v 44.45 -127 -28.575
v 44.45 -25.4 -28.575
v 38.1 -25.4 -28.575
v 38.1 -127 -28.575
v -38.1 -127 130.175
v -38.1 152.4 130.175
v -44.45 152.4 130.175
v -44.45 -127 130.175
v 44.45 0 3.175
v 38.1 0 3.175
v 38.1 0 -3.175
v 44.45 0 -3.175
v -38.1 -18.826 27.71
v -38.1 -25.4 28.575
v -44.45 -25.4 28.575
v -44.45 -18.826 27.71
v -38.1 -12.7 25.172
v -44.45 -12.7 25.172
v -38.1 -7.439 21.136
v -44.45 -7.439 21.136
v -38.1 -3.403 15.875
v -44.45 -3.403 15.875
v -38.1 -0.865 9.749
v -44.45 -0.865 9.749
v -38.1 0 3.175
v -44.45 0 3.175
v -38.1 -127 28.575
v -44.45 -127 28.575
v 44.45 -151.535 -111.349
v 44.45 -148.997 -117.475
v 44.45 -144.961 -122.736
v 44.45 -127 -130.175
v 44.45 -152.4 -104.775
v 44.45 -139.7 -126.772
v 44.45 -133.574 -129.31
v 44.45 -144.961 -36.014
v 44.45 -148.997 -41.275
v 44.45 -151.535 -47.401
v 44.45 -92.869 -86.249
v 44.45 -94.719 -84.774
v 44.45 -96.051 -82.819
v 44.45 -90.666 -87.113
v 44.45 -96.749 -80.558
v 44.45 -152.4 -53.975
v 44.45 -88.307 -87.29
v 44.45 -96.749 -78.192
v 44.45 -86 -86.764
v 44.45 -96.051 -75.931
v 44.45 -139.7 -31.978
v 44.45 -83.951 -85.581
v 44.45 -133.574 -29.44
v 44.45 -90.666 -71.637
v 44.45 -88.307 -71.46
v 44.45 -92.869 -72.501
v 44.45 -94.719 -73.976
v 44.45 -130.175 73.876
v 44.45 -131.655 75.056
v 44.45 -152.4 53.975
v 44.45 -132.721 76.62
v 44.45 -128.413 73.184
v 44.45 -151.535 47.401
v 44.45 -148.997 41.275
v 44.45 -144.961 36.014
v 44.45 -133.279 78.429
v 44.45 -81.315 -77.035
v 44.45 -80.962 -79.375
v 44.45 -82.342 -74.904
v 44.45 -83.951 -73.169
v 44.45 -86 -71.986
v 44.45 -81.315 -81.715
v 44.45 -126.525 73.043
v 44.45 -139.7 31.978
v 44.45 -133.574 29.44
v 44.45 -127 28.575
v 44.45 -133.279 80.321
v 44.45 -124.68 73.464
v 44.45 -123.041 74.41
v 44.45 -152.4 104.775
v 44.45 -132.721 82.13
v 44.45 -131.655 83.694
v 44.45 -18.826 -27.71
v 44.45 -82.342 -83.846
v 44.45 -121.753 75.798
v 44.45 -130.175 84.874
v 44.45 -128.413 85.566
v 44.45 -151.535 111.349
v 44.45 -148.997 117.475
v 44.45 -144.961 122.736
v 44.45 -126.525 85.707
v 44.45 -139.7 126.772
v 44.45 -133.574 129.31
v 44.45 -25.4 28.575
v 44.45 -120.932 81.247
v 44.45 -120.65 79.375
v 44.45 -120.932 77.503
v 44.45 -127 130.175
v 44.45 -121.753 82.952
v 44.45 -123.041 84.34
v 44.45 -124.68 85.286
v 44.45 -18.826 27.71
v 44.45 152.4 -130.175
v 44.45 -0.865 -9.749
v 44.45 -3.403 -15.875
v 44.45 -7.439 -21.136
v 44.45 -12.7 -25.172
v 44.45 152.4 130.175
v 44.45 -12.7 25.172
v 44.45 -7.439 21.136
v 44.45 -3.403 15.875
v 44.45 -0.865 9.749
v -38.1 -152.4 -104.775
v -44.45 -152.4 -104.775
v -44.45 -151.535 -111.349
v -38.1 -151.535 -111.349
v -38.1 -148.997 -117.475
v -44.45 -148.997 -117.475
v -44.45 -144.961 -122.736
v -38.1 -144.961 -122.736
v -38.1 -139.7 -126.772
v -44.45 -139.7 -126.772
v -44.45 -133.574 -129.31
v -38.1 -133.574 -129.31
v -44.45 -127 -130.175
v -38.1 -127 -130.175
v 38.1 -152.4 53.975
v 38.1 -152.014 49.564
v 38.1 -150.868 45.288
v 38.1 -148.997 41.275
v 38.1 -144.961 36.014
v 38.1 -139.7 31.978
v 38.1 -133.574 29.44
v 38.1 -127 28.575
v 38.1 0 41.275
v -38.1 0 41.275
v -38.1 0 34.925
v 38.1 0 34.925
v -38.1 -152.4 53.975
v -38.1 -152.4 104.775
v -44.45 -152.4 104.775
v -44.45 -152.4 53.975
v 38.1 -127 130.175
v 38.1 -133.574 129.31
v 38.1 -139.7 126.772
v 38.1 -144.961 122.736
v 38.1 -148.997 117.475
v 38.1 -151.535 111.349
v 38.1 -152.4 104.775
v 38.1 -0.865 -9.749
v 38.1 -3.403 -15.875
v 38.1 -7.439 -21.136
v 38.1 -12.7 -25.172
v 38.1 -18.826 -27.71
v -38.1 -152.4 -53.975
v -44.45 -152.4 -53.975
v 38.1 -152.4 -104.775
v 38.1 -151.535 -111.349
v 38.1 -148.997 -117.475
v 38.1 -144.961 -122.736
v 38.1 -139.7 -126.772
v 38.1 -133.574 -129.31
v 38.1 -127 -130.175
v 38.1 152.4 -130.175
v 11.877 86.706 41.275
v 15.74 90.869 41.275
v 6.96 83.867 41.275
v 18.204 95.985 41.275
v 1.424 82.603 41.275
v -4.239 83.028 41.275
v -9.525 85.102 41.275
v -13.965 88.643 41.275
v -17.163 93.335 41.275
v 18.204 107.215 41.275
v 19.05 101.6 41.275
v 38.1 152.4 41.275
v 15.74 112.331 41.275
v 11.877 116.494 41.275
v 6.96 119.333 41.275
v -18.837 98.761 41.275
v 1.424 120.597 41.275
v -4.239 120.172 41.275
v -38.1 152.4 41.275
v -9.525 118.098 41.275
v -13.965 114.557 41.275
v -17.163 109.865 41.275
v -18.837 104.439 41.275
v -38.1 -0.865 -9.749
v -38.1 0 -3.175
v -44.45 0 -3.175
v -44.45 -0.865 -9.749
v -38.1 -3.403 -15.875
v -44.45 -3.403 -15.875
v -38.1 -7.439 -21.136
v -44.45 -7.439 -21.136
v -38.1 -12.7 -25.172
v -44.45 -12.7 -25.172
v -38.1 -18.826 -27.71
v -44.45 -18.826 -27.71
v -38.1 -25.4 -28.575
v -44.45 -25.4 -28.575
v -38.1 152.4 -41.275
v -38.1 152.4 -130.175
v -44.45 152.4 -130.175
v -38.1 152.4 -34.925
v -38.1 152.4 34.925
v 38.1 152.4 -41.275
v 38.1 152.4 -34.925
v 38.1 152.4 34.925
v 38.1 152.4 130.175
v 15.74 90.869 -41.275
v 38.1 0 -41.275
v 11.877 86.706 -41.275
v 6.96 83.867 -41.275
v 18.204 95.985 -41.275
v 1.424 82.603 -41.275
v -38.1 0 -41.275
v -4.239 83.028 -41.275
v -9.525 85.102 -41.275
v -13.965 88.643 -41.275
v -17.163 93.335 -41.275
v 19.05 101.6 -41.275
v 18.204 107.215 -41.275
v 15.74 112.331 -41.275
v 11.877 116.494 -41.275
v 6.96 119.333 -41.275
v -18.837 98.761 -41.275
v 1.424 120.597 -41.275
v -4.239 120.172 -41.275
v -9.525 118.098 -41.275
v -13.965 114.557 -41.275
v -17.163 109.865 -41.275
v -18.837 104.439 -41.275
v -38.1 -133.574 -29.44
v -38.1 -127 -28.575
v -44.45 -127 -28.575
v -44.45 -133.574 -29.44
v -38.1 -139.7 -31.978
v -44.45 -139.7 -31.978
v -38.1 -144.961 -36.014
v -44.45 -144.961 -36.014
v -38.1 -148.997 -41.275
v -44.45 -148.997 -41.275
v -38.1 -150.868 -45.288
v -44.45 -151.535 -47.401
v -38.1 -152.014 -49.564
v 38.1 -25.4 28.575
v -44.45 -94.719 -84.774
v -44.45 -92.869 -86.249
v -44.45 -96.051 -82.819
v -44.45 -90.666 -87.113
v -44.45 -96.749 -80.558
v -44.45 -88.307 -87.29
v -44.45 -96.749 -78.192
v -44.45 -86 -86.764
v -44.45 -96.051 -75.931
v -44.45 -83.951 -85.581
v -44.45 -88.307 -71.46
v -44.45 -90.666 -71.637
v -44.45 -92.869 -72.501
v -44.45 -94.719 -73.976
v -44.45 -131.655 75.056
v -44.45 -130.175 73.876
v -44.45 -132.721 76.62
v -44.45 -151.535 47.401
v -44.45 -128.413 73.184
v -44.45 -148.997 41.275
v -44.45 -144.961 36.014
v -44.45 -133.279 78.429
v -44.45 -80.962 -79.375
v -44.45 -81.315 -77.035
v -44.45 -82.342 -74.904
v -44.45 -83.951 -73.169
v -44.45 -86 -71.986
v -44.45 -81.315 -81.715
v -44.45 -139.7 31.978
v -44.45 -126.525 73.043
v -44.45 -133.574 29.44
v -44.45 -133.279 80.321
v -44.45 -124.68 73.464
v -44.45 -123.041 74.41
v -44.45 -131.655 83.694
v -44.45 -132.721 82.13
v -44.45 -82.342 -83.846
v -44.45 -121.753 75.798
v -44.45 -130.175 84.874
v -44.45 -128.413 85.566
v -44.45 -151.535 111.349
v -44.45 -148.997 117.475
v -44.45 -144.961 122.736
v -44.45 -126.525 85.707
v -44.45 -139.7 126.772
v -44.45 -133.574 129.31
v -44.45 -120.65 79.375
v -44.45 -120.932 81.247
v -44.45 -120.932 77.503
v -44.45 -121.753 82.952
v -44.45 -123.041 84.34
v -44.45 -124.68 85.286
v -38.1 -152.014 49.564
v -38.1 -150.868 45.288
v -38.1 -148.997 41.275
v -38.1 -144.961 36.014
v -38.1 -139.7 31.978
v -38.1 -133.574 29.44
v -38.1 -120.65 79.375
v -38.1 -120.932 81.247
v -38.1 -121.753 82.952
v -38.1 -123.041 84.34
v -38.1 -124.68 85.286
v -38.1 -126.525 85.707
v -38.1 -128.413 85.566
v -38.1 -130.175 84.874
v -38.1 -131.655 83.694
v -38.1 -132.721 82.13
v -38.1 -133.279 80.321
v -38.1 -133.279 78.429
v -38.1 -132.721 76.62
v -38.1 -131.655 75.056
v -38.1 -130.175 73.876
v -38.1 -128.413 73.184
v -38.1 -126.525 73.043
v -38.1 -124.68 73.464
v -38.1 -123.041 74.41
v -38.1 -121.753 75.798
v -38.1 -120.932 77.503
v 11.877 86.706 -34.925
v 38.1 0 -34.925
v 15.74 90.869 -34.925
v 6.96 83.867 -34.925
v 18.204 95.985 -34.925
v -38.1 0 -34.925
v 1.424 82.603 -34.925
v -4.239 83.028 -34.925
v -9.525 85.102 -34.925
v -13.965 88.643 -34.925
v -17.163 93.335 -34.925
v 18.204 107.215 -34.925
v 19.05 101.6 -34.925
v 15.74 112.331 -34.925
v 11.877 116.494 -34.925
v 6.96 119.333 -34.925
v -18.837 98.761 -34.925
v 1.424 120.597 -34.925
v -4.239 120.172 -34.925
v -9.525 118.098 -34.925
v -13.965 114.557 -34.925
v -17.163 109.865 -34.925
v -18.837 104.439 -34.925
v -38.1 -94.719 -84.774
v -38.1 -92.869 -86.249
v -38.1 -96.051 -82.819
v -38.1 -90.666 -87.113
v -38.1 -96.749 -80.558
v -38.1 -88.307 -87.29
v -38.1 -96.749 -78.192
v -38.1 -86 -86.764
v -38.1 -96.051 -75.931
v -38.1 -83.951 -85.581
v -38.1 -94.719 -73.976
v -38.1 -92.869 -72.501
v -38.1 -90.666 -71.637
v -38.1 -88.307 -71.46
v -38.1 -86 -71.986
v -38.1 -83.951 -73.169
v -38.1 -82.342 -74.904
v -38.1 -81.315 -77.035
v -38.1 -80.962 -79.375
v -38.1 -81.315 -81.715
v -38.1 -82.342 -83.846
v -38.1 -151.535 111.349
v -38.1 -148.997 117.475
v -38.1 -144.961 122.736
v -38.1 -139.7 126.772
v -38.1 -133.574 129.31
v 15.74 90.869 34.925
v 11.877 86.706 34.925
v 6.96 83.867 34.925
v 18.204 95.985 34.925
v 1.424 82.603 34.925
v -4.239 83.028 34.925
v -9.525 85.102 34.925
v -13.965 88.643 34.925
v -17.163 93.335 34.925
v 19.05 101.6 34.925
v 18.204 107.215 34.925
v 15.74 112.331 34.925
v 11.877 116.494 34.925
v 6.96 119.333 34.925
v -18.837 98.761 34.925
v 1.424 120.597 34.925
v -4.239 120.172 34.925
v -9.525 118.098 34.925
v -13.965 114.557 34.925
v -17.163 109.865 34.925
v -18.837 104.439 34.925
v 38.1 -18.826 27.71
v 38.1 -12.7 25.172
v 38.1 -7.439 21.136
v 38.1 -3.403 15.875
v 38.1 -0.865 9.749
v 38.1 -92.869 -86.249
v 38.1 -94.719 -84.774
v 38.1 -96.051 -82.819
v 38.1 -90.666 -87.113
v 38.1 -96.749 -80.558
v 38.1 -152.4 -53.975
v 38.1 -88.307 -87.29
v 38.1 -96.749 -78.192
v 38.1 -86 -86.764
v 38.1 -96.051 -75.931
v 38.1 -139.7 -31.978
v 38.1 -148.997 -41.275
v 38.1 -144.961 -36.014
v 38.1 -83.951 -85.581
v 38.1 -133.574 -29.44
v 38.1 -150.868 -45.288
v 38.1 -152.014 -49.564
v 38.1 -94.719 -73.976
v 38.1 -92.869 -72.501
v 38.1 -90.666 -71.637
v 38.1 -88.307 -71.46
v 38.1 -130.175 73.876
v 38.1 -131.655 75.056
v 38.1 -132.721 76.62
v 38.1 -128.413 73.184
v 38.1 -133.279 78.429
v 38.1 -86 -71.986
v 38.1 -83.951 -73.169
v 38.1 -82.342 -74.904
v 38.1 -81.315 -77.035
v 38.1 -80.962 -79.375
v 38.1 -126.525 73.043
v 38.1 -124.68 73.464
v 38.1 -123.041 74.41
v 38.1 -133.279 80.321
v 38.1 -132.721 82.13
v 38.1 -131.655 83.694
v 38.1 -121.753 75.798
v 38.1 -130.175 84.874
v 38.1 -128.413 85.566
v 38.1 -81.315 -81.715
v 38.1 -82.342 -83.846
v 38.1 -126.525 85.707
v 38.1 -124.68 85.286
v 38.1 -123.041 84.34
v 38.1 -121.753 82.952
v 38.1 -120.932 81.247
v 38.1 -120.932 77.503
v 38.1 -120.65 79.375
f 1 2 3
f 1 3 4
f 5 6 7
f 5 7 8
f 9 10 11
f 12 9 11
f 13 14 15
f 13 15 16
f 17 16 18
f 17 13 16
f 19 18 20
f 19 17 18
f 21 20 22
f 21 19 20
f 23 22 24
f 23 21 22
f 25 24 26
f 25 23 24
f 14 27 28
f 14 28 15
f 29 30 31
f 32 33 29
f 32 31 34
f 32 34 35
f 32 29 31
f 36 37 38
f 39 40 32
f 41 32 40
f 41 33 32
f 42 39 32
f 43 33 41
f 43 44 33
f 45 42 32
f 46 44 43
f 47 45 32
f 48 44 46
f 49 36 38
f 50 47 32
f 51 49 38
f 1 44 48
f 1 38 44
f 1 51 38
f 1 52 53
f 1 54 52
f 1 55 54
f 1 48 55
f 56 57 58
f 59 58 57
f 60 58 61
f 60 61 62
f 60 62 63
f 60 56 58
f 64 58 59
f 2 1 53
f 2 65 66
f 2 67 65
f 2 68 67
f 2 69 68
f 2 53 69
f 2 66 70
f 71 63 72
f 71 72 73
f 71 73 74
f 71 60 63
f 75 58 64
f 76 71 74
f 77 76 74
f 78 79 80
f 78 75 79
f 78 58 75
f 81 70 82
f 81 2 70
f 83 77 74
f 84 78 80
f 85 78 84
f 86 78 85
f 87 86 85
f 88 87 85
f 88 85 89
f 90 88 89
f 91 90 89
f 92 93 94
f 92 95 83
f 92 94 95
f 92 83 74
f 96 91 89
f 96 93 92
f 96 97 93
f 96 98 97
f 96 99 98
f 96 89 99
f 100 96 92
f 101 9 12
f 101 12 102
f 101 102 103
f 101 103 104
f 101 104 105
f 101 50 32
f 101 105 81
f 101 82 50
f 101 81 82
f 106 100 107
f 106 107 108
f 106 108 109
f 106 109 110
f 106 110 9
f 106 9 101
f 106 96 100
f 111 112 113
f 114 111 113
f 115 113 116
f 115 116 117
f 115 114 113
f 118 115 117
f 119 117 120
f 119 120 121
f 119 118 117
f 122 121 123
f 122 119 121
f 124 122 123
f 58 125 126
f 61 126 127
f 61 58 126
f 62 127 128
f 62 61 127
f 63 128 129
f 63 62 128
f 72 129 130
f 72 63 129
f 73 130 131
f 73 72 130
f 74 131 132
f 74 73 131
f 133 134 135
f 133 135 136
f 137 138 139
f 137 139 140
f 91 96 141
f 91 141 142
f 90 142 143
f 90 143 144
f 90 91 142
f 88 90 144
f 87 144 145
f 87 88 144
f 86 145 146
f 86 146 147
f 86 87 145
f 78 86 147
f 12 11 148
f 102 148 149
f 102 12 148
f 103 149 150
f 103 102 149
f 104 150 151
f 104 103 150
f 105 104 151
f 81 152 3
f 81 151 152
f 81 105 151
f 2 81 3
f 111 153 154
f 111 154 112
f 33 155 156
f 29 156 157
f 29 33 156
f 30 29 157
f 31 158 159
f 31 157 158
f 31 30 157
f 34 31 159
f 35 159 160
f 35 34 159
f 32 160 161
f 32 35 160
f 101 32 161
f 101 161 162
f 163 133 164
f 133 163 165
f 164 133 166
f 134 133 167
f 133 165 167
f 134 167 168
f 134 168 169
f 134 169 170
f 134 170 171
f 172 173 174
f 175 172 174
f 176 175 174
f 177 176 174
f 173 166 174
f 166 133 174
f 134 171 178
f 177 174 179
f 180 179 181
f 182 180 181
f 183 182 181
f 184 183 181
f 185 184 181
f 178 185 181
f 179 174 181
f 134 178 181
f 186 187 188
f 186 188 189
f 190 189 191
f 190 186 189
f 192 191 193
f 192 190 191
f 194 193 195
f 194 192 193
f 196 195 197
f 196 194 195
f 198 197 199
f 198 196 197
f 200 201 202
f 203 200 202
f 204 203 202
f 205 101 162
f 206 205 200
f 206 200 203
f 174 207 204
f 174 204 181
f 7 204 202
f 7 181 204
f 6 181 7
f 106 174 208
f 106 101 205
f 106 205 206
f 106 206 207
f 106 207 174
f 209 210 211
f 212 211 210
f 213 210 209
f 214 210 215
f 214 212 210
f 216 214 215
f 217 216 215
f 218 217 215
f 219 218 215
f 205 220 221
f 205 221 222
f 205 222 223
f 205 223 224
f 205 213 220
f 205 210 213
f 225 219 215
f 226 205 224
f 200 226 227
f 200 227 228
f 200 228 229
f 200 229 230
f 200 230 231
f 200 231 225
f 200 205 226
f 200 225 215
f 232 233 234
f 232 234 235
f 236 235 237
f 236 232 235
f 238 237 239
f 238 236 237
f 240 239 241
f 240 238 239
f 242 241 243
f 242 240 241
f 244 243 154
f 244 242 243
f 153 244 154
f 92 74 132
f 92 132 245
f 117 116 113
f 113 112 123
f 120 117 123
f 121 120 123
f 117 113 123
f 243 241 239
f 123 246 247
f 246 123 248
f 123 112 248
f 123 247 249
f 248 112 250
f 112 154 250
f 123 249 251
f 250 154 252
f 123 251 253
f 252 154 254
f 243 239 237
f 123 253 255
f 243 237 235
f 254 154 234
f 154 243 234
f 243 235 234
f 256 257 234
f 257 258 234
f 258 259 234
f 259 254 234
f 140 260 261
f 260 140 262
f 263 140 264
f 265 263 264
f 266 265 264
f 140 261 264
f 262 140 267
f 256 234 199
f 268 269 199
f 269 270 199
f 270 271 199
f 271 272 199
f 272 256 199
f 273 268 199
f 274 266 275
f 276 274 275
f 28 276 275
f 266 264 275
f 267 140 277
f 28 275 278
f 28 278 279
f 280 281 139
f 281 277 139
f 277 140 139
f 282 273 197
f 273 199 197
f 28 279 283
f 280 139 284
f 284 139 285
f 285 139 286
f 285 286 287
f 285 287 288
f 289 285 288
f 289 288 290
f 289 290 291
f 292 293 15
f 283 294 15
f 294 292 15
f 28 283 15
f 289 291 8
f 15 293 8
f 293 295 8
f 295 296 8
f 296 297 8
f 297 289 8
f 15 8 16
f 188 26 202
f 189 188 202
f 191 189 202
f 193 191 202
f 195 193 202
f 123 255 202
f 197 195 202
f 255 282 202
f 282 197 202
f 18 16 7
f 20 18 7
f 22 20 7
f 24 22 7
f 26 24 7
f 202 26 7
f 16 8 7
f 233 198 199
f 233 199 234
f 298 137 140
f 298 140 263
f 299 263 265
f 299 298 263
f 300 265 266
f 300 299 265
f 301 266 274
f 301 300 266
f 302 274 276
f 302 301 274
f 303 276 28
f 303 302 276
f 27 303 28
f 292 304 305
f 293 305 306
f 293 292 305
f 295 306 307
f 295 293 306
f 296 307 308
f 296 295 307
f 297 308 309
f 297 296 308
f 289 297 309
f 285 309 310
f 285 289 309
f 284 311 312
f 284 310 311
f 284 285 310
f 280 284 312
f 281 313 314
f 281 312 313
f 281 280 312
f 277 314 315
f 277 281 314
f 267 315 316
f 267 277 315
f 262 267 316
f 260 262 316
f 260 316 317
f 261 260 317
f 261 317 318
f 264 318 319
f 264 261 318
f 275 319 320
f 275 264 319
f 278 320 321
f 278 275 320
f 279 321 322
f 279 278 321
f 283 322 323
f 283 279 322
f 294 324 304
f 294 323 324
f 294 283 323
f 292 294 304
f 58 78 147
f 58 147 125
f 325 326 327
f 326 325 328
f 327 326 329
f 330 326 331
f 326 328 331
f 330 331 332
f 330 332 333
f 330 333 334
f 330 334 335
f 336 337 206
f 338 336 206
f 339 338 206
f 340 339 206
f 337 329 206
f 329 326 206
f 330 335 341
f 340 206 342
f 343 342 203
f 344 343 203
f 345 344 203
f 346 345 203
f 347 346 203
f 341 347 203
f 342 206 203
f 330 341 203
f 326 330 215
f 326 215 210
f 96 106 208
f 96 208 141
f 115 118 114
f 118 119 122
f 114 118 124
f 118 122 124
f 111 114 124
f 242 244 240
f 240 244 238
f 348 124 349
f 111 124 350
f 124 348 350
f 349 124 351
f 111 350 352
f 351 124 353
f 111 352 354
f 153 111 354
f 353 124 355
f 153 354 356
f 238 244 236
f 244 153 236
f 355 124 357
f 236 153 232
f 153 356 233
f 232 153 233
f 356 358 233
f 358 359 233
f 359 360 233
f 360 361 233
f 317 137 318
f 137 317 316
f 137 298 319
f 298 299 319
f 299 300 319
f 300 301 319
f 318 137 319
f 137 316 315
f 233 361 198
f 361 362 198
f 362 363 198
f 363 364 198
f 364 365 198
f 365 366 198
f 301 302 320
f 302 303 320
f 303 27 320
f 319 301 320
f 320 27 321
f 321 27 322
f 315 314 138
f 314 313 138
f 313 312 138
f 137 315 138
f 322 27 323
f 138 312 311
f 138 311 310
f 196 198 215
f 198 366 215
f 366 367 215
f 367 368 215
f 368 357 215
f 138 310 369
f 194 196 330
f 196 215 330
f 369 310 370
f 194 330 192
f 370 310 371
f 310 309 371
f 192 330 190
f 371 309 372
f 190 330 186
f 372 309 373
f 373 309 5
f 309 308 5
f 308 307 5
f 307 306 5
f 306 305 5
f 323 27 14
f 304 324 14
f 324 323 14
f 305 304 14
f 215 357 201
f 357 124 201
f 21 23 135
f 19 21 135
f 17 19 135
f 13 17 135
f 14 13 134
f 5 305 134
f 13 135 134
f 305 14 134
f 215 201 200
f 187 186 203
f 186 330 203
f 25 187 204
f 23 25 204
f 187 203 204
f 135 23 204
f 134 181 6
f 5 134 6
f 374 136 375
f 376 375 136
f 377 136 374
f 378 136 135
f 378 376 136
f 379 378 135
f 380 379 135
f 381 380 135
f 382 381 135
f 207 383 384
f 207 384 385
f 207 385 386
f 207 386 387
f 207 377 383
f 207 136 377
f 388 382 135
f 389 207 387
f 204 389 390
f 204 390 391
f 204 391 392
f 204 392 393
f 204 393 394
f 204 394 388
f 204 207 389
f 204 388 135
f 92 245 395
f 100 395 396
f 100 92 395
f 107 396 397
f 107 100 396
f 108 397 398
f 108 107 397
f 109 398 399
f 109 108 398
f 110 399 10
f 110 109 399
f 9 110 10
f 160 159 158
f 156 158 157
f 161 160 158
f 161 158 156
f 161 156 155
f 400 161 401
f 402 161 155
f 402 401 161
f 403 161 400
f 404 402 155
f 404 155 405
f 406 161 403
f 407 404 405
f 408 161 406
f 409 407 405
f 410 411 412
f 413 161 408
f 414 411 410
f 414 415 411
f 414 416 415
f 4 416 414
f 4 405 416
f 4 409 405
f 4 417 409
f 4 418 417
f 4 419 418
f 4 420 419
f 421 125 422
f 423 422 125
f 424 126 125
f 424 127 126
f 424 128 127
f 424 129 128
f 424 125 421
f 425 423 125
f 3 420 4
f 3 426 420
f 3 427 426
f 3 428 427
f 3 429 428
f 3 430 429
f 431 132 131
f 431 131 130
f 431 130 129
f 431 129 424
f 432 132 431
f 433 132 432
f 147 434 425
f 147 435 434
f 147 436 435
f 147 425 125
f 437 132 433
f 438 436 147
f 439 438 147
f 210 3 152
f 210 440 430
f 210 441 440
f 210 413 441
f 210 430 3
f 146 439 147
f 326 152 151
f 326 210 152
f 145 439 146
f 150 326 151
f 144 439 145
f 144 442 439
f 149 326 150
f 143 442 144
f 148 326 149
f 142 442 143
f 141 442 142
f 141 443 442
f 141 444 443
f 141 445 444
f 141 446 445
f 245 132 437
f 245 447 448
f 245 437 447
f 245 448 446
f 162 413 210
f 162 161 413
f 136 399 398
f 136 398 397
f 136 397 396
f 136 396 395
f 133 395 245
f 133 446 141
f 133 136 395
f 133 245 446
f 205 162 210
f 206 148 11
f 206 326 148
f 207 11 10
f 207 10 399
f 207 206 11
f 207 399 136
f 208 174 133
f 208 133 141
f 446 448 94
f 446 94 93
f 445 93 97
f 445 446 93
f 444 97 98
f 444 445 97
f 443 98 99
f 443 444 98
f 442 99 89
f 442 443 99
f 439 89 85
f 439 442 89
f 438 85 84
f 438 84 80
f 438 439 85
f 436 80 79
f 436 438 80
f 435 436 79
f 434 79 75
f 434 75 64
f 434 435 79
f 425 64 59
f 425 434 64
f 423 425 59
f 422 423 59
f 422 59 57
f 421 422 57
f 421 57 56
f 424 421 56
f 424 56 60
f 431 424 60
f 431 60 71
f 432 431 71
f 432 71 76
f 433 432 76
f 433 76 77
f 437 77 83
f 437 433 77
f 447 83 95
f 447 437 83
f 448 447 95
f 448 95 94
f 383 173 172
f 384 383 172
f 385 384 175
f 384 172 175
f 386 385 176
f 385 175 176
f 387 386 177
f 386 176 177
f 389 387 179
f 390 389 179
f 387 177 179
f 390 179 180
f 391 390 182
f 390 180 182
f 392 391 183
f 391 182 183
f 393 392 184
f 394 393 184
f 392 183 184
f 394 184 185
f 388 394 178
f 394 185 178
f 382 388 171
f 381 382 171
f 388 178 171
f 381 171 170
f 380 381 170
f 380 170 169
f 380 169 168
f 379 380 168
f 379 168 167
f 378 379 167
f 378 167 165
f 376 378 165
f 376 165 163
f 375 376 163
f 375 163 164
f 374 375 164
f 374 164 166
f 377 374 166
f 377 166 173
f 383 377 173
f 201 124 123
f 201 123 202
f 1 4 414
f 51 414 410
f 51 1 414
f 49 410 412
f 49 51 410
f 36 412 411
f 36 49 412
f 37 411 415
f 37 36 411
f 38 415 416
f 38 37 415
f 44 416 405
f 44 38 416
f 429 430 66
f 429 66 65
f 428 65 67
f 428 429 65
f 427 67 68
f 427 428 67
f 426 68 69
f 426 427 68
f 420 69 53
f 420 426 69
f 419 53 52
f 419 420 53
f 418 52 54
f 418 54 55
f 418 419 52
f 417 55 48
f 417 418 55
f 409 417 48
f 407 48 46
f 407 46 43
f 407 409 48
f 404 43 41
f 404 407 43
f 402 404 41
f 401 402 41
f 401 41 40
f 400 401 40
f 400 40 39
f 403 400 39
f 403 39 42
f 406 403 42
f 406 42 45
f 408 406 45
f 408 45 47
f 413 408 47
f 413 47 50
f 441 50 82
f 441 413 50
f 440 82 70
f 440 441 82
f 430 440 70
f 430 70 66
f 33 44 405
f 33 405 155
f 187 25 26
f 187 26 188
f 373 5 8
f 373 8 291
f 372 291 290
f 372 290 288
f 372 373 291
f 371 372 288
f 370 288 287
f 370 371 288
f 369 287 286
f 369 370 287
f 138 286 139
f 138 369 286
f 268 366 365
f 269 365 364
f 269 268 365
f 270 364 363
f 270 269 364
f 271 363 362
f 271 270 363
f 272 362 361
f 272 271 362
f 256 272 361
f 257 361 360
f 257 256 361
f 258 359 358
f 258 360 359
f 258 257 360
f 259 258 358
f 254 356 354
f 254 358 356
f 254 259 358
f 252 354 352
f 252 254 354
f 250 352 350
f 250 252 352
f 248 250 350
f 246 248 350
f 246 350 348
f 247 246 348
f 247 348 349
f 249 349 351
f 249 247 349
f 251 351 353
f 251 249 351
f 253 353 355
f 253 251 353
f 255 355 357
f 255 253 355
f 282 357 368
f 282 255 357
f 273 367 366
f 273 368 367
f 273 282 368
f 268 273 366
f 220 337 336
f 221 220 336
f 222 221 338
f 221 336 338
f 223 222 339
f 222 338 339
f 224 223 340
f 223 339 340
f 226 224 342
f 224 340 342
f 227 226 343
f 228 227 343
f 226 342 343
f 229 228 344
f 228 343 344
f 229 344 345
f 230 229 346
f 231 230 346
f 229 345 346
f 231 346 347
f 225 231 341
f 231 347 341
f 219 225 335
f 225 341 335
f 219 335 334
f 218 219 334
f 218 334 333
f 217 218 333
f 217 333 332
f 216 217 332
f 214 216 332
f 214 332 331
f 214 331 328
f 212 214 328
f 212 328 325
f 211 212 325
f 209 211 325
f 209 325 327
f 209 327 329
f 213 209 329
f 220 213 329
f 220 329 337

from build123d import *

# Parameters (mm, degrees)
F0_R     = 7.9375
F0_R_2   = 6.35
F1_DEPTH = 44.45
F2_W     = 76.2
F2_H     = 88.9
F2_H_2   = 69.85
F3_DEPTH = 304.801
F4_W     = 76.2
F4_H     = 148.997045
F4_R     = 19.05
F5_DEPTH = 171.451


with BuildPart() as f1:
    # F0 (on Right) → F1 (new body, symmetric)
    with BuildSketch(Plane.YZ):
        with BuildLine():
            Line((152.4, 130.175), (-127, 130.175))
            ThreePointArc((-127, 130.175), (-144.960512, 122.735512), (-152.4, 104.775))
            Line((-152.4, 104.775), (-152.4, 53.975))
            ThreePointArc((-152.4, 53.975), (-144.960512, 36.014488), (-127, 28.575))
            Line((-127, 28.575), (-25.4, 28.575))
            ThreePointArc((-25.4, 28.575), (-7.439488, 21.135512), (0, 3.175))
            Line((0, 3.175), (0, -3.175))
            ThreePointArc((0, -3.175), (-7.439488, -21.135512), (-25.4, -28.575))
            Line((-25.4, -28.575), (-127, -28.575))
            ThreePointArc((-127, -28.575), (-144.960512, -36.014488), (-152.4, -53.975))
            Line((-152.4, -53.975), (-152.4, -104.775))
            ThreePointArc((-152.4, -104.775), (-144.960512, -122.735512), (-127, -130.175))
            Line((-127, -130.175), (152.4, -130.175))
            Line((152.4, -130.175), (152.4, 130.175))
        make_face()
        with Locations((-88.9, -79.375)):
            Circle(F0_R, mode=Mode.SUBTRACT)
        with Locations((-127, 79.375)):
            Circle(F0_R_2, mode=Mode.SUBTRACT)
    extrude(amount=F1_DEPTH, both=True)

    # F2 (on face) → F3 (cut, through all)
    with BuildSketch(Plane(origin=(0, 152.4, 0), x_dir=(-1, 0, 0), z_dir=(0, 1, 0))):
        with Locations((0, 85.725)):
            Rectangle(F2_W, F2_H)
        Rectangle(F2_W, F2_H_2)
        with Locations((0, -85.725)):
            Rectangle(F2_W, F2_H)
    extrude(amount=-F3_DEPTH, mode=Mode.SUBTRACT)

    # F4 (on face) → F5 (cut, through all)
    with BuildSketch(Plane.XY.offset(41.275)):
        with Locations((0, -74.498522)):
            Rectangle(F4_W, F4_H)
        with Locations((0, 101.6)):
            Circle(F4_R)
    extrude(amount=-F5_DEPTH, mode=Mode.SUBTRACT)


solid = f1.part
